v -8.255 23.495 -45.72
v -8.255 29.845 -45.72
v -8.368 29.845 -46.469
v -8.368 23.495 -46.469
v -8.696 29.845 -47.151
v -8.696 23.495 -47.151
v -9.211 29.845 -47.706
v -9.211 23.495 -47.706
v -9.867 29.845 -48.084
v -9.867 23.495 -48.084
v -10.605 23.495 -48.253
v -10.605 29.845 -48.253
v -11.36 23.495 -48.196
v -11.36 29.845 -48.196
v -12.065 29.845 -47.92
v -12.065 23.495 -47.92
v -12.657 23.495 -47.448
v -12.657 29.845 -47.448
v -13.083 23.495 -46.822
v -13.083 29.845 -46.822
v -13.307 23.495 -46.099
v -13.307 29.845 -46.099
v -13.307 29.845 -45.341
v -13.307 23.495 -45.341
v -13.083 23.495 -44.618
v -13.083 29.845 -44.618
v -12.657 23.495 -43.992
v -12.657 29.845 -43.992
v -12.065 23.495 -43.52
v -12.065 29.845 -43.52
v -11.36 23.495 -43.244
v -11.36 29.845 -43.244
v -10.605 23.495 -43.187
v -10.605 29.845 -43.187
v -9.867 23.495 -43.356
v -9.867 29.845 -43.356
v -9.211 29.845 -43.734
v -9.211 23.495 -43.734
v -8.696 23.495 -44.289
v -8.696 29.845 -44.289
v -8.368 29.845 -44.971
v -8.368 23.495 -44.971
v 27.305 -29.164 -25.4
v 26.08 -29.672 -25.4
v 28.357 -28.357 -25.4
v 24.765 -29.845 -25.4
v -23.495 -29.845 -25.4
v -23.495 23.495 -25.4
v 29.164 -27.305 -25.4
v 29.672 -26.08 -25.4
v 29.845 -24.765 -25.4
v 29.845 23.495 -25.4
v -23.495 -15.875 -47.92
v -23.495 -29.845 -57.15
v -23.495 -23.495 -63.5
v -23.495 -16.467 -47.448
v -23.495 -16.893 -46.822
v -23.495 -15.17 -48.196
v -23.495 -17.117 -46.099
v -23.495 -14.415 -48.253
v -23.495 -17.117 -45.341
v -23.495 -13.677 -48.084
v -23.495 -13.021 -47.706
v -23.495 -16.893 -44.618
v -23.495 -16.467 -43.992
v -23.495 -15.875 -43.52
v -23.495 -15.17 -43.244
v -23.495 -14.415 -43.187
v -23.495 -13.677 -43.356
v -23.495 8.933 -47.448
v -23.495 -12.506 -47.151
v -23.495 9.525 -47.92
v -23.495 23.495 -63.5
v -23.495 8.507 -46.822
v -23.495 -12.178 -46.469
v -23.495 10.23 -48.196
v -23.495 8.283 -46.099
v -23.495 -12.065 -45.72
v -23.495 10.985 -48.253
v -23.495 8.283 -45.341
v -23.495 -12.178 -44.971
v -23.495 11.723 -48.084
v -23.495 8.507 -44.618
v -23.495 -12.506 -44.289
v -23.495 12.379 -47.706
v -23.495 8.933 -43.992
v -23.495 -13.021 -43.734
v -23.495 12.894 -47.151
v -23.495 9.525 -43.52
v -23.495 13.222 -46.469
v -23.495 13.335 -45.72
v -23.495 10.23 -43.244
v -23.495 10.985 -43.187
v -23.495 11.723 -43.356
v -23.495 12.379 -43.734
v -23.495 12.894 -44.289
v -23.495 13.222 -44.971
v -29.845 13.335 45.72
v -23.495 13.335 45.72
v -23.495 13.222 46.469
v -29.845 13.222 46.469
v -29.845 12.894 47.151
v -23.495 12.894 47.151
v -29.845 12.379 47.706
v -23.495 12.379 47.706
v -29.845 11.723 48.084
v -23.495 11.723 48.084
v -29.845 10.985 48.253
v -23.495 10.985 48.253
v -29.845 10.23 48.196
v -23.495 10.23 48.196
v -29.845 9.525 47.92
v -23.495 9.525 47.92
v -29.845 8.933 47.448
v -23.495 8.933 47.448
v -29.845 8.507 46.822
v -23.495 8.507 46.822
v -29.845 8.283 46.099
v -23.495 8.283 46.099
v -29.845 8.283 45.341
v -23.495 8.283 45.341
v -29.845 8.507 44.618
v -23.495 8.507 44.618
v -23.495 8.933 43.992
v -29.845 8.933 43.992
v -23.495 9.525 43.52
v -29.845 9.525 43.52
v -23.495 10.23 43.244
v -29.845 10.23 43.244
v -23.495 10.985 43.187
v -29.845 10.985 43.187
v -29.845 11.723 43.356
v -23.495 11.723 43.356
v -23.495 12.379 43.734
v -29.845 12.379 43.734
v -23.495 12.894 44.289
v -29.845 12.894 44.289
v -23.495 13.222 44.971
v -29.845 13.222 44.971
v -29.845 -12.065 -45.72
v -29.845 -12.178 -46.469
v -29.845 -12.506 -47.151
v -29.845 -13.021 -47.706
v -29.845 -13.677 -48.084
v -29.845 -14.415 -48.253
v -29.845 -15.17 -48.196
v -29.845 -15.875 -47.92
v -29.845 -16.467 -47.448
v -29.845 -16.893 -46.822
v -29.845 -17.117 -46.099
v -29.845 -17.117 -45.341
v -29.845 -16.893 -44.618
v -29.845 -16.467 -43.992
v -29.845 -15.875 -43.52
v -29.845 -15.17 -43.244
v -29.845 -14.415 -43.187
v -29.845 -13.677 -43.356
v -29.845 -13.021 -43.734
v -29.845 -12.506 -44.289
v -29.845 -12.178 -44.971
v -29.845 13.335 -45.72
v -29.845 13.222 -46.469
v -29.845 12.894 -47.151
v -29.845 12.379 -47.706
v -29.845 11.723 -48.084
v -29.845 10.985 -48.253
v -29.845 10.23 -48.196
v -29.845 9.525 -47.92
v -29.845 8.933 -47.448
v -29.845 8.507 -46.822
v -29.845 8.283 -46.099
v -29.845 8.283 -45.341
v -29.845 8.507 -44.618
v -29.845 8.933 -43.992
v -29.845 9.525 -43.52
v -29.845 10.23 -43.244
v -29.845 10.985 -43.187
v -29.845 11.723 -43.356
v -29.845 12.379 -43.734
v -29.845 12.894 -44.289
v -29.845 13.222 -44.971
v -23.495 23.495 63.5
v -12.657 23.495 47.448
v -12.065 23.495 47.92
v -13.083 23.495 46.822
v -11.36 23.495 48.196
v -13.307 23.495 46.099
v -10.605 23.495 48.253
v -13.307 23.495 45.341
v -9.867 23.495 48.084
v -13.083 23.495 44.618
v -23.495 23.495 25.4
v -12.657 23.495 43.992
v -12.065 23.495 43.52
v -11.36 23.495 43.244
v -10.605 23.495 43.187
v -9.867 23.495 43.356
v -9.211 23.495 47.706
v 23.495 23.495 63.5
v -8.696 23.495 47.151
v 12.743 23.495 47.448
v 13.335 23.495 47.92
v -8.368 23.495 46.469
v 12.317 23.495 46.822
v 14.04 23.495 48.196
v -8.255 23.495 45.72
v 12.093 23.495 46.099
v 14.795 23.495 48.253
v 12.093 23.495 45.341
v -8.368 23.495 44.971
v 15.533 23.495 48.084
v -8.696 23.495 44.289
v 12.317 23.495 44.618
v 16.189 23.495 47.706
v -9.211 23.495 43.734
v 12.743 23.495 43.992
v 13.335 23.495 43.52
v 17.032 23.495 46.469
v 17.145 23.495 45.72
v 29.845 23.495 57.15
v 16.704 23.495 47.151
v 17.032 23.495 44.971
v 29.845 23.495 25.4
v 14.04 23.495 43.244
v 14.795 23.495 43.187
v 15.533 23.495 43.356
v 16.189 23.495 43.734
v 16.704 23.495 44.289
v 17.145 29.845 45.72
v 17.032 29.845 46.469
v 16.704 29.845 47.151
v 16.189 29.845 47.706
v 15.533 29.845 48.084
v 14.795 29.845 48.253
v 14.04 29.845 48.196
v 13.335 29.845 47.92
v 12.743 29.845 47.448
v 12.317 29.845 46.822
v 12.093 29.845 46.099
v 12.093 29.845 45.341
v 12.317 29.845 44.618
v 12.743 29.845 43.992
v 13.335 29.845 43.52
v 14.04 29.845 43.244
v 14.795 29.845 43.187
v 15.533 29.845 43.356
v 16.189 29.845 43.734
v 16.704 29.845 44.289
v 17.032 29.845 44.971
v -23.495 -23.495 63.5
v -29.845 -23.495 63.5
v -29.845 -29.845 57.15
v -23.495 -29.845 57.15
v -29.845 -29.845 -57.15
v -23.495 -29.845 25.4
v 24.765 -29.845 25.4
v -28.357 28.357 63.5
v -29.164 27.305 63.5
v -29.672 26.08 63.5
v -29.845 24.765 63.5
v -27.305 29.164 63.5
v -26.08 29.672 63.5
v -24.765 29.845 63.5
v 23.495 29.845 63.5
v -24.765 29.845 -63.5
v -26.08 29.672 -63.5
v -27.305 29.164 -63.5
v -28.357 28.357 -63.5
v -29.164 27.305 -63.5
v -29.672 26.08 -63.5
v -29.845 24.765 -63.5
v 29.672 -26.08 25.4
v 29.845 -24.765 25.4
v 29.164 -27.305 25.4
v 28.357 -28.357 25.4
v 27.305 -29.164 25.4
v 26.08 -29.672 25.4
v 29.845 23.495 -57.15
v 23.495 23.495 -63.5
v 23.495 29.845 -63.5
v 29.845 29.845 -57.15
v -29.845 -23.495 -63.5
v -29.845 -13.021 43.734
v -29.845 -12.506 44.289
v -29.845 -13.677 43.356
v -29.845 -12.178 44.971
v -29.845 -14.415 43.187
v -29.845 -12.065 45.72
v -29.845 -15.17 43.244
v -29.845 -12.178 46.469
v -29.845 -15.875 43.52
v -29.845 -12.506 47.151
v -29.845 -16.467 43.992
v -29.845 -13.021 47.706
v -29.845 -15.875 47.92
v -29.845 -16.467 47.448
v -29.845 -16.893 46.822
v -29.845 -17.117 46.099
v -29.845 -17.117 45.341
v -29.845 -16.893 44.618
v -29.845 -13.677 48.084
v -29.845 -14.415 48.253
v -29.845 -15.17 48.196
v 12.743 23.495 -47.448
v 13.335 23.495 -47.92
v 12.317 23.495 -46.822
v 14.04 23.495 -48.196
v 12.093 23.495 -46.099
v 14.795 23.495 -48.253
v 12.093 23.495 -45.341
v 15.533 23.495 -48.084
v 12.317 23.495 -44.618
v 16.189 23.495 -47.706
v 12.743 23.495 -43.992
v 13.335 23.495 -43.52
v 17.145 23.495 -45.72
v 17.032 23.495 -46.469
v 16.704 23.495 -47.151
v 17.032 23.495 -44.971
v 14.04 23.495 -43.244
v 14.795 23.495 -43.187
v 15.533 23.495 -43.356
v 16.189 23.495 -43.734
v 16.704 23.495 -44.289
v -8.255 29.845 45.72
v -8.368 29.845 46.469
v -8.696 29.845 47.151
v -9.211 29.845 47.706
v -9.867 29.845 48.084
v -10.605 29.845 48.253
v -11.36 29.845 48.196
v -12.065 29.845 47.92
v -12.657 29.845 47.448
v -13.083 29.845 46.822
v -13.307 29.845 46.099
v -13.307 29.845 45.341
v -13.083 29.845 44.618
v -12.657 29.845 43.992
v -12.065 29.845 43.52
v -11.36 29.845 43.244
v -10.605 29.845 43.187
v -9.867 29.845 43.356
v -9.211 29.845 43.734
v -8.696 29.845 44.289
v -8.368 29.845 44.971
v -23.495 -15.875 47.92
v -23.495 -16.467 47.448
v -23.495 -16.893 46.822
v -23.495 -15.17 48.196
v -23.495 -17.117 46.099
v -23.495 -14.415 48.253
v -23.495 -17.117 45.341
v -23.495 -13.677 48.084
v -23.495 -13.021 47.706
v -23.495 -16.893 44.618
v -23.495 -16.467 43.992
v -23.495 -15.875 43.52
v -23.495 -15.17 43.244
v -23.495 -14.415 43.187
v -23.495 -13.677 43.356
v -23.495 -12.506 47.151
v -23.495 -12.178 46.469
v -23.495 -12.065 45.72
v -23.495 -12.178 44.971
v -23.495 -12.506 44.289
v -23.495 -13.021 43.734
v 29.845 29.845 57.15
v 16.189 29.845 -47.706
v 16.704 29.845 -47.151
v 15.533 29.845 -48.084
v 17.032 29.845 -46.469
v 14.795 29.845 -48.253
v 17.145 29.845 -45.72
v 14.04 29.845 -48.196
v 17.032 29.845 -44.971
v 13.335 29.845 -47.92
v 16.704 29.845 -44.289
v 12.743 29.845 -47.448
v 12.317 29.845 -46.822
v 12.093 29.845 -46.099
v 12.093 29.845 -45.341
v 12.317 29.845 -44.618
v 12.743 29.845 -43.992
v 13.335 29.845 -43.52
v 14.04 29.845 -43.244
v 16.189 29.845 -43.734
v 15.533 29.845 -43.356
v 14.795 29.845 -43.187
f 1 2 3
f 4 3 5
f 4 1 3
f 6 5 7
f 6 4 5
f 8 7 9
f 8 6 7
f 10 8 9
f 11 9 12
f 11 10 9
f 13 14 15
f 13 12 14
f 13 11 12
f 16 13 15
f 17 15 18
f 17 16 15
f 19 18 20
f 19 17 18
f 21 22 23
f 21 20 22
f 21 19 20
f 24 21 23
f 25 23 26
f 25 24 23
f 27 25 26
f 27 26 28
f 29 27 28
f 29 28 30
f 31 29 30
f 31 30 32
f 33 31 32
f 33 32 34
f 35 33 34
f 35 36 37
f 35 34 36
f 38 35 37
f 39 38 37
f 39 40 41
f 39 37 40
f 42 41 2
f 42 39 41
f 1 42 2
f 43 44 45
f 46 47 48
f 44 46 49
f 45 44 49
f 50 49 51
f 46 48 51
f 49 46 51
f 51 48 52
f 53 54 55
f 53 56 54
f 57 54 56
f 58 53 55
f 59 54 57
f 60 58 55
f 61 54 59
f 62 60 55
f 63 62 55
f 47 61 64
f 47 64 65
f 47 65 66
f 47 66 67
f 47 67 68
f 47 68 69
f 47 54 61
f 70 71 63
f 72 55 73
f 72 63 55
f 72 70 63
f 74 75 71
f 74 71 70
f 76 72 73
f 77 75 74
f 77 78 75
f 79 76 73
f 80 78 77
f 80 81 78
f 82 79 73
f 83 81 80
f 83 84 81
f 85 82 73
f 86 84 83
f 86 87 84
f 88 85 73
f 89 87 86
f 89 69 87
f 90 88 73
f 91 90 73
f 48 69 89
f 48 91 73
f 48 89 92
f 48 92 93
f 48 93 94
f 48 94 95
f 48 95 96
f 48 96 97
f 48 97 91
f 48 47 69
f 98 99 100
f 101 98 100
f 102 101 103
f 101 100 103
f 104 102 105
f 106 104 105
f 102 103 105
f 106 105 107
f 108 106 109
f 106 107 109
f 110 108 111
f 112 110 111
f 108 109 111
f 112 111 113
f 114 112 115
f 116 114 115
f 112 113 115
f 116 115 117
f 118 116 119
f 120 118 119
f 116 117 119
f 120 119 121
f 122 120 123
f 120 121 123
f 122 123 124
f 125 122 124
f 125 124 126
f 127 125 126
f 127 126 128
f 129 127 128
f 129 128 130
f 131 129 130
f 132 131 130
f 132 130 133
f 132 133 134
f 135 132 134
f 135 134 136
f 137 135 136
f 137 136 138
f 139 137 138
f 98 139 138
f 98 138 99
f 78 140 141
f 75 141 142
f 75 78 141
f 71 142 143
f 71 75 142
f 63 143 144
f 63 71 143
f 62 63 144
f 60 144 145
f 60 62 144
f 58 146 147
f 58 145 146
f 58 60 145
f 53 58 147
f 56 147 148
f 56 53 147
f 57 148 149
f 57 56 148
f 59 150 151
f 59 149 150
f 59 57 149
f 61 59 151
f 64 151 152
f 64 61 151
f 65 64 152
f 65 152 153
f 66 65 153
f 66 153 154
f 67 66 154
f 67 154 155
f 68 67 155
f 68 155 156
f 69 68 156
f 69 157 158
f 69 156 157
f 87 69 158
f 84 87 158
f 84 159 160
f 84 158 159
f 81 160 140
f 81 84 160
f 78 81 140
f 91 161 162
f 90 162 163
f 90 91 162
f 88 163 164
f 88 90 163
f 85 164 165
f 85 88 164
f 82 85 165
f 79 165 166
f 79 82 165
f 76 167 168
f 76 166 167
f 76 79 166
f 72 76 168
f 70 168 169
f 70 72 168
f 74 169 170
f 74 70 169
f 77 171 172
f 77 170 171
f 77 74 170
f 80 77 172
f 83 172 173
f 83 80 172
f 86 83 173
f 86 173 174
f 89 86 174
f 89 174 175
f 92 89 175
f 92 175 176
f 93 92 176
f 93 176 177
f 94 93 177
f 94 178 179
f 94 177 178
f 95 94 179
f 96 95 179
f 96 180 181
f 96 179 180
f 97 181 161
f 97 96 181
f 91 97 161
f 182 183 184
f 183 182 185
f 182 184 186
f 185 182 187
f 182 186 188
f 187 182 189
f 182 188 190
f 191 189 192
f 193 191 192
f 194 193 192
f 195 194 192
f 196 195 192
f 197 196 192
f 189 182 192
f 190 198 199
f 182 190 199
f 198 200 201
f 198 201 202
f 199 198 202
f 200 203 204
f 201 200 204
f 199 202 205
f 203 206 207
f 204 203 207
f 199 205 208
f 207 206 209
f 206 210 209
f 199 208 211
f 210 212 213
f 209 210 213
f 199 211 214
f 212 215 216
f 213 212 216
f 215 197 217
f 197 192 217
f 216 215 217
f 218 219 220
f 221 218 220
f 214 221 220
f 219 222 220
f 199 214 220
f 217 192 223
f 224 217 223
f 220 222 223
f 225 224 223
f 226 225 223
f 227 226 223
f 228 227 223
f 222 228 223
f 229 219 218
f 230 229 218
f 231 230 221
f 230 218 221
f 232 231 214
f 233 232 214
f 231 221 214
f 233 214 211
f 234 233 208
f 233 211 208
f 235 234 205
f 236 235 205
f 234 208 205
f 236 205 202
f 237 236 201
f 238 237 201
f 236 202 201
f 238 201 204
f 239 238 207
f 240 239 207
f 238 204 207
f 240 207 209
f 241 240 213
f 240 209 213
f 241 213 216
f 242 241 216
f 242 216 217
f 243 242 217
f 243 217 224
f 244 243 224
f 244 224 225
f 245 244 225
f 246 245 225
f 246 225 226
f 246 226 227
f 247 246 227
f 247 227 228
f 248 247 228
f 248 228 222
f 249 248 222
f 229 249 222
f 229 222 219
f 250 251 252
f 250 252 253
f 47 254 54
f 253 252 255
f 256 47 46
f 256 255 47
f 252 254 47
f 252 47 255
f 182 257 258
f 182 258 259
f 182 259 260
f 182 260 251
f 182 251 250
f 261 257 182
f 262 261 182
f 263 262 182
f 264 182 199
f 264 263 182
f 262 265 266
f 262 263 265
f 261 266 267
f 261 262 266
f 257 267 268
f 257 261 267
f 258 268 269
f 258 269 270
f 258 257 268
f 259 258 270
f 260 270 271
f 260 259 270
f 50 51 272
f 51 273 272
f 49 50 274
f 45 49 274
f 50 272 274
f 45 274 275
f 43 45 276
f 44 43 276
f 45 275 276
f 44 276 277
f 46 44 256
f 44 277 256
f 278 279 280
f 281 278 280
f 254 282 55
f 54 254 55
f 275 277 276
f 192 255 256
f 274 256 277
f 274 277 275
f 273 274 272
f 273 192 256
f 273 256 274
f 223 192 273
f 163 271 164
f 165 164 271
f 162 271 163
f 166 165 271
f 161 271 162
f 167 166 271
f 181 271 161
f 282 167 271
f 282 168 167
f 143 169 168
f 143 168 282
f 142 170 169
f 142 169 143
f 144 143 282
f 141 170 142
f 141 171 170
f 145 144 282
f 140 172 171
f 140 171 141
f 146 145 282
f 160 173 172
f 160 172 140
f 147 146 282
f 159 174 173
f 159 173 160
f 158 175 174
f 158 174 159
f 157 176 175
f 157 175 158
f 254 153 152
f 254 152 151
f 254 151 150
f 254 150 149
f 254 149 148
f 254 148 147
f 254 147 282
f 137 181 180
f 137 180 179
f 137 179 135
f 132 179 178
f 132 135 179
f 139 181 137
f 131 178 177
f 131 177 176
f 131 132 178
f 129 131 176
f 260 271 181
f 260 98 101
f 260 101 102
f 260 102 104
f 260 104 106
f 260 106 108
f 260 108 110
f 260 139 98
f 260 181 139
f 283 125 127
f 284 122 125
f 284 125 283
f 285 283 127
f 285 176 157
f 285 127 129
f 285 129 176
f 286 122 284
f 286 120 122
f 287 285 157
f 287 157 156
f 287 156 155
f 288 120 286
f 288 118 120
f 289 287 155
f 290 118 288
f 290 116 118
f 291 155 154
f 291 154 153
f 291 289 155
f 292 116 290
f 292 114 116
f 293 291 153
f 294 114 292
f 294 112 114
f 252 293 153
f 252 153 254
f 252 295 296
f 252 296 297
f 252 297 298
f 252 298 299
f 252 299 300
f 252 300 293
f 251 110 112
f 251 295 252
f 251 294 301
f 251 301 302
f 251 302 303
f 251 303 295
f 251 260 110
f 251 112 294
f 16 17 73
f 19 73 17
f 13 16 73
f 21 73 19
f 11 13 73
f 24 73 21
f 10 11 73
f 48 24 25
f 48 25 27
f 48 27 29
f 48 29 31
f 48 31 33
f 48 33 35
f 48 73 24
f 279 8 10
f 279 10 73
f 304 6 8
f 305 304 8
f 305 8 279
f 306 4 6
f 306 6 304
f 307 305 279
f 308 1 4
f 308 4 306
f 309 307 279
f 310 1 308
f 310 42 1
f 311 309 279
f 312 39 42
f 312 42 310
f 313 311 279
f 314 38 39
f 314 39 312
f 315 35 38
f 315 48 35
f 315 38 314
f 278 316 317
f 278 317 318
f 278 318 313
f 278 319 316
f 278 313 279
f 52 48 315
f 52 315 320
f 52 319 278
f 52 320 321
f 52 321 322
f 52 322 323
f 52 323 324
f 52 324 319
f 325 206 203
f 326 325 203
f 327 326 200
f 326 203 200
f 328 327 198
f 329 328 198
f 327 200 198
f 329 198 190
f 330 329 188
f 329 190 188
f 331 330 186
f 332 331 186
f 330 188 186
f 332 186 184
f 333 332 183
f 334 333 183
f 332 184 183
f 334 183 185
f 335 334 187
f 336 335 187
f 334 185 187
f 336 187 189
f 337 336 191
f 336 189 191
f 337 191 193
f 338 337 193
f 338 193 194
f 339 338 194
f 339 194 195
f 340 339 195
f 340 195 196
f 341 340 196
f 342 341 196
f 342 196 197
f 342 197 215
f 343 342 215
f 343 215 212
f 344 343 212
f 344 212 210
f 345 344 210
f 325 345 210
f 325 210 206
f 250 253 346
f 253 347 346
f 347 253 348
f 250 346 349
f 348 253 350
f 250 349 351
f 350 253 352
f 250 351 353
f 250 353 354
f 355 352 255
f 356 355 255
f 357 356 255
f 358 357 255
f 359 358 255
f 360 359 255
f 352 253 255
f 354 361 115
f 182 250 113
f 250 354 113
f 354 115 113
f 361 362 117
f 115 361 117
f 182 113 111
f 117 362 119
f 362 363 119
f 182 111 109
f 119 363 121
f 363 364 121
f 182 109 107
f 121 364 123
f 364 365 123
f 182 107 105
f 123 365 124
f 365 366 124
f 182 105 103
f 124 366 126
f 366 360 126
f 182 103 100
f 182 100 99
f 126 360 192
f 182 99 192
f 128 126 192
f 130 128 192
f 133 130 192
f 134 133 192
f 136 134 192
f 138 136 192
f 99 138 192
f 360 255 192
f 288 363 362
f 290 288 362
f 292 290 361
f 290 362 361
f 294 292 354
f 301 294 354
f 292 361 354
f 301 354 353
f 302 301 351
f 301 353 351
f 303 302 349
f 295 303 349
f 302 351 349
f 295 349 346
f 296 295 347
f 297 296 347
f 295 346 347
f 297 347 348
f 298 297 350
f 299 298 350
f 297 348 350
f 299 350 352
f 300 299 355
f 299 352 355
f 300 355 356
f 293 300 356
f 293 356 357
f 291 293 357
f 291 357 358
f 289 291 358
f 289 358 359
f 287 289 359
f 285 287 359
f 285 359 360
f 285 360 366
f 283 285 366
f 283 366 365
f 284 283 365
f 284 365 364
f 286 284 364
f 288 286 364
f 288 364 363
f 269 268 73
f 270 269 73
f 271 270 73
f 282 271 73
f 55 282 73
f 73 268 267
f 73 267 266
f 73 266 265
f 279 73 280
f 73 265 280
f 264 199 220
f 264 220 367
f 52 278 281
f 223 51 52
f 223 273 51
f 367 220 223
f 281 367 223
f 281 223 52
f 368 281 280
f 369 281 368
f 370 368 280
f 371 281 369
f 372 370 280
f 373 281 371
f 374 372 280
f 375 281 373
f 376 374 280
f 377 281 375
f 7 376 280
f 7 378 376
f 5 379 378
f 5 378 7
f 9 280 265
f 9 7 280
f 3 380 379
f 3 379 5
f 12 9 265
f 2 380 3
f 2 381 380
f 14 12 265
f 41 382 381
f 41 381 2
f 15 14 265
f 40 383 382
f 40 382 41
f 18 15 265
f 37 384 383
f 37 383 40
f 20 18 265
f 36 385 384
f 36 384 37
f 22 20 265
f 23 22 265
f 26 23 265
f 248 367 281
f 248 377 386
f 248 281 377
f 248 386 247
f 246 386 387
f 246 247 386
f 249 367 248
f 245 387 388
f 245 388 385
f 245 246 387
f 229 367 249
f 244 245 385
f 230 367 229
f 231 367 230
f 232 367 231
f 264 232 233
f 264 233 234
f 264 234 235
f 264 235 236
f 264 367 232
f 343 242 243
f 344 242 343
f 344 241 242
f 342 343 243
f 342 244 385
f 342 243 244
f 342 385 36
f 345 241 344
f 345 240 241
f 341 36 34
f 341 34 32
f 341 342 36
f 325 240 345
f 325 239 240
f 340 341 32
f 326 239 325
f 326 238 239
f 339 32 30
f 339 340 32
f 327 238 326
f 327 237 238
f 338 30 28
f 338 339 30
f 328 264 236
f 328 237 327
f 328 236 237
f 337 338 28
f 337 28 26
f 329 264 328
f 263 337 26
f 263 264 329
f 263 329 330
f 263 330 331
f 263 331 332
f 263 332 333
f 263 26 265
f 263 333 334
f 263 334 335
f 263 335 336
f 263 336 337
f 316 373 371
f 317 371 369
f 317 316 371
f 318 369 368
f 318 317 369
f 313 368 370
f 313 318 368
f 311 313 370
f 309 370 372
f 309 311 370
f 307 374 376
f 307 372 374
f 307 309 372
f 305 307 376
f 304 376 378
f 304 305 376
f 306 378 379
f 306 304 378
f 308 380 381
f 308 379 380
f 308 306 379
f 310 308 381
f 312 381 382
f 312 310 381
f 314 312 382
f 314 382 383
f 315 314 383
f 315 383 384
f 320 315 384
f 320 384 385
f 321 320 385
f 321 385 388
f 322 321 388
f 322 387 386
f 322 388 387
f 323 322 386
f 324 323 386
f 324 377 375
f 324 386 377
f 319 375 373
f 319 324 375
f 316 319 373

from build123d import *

# Parameters (mm, degrees)
F0_W          = 59.69
F0_H          = 59.69
F1_DEPTH      = 25.4
F1_DEPTH_BACK = 25.4
F3_DEPTH      = 38.1
F4_SIZE       = 6.35
F5_R          = 5.08
F6_R          = 5.08
F7_R          = 2.54
F8_DEPTH      = 25.4
F9_R          = 2.54
F10_DEPTH     = 25.4


# Not quite as in the source:
# - a pattern or mirror of a feature is missing from the dataset's text; its kind, count and spacing are read off the source's solid


with BuildPart() as f1:
    # F0 (on Top) → F1 (new body, two sides)
    with BuildSketch(Plane.XY) as f1_sk:
        Rectangle(F0_W, F0_H)
    extrude(amount=F1_DEPTH)
    extrude(f1_sk.sketch, amount=-F1_DEPTH_BACK)

    # F2 (on face) → F3 (join)
    with BuildSketch(Plane.XY.offset(25.4)):
        Polygon((-23.495, 23.495), (29.845, 23.495), (29.845, 29.845), (-29.845, 29.845), (-29.845, -29.845), (-23.495, -29.845), align=None)
    f3 = extrude(amount=F3_DEPTH)

    # F3_copies: F3 across plane
    add(f3.mirror(Plane(origin=(0, 0, 0), x_dir=(-1, 0, 0), z_dir=(0, 0, -1))))

    # F4
    f4_edges = [f1.edges().sort_by_distance(p)[0] for p in [
        (-26.67, -29.845, 63.5),
        (29.845, 26.67, 63.5),
        (-26.67, -29.845, -63.5),
        (29.845, 26.67, -63.5),
    ]]
    chamfer(f4_edges, length=F4_SIZE)

    # F5
    f5_edges = [f1.edges().sort_by_distance(p)[0] for p in [
        (29.845, -29.845, 0),
    ]]
    fillet(f5_edges, radius=F5_R)

    # F6
    f6_edges = [f1.edges().sort_by_distance(p)[0] for p in [
        (-29.845, 29.845, 0),
    ]]
    fillet(f6_edges, radius=F6_R)

    # F7 (on face) → F8 (cut)
    with BuildSketch(Plane.XZ.offset(-23.495)):
        with Locations((-10.795, 45.72)):
            Circle(F7_R)
        with Locations((14.605, 45.72)):
            Circle(F7_R)
    f8 = extrude(amount=-F8_DEPTH, mode=Mode.SUBTRACT)

    # F8_copies: F8 across plane
    add(f8.mirror(Plane(origin=(0, 0, 0), x_dir=(-1, 0, 0), z_dir=(0, 0, -1))), mode=Mode.SUBTRACT)

    # F9 (on face) → F10 (cut)
    with BuildSketch(Plane.YZ.offset(-23.495)):
        with Locations((-14.605, 45.72)):
            Circle(F9_R)
        with Locations((10.795, 45.72)):
            Circle(F9_R)
    f10 = extrude(amount=-F10_DEPTH, mode=Mode.SUBTRACT)

    # F10_copies: F10 across plane
    add(f10.mirror(Plane(origin=(0, 0, 0), x_dir=(-1, 0, 0), z_dir=(0, 0, -1))), mode=Mode.SUBTRACT)


solid = f1.part
